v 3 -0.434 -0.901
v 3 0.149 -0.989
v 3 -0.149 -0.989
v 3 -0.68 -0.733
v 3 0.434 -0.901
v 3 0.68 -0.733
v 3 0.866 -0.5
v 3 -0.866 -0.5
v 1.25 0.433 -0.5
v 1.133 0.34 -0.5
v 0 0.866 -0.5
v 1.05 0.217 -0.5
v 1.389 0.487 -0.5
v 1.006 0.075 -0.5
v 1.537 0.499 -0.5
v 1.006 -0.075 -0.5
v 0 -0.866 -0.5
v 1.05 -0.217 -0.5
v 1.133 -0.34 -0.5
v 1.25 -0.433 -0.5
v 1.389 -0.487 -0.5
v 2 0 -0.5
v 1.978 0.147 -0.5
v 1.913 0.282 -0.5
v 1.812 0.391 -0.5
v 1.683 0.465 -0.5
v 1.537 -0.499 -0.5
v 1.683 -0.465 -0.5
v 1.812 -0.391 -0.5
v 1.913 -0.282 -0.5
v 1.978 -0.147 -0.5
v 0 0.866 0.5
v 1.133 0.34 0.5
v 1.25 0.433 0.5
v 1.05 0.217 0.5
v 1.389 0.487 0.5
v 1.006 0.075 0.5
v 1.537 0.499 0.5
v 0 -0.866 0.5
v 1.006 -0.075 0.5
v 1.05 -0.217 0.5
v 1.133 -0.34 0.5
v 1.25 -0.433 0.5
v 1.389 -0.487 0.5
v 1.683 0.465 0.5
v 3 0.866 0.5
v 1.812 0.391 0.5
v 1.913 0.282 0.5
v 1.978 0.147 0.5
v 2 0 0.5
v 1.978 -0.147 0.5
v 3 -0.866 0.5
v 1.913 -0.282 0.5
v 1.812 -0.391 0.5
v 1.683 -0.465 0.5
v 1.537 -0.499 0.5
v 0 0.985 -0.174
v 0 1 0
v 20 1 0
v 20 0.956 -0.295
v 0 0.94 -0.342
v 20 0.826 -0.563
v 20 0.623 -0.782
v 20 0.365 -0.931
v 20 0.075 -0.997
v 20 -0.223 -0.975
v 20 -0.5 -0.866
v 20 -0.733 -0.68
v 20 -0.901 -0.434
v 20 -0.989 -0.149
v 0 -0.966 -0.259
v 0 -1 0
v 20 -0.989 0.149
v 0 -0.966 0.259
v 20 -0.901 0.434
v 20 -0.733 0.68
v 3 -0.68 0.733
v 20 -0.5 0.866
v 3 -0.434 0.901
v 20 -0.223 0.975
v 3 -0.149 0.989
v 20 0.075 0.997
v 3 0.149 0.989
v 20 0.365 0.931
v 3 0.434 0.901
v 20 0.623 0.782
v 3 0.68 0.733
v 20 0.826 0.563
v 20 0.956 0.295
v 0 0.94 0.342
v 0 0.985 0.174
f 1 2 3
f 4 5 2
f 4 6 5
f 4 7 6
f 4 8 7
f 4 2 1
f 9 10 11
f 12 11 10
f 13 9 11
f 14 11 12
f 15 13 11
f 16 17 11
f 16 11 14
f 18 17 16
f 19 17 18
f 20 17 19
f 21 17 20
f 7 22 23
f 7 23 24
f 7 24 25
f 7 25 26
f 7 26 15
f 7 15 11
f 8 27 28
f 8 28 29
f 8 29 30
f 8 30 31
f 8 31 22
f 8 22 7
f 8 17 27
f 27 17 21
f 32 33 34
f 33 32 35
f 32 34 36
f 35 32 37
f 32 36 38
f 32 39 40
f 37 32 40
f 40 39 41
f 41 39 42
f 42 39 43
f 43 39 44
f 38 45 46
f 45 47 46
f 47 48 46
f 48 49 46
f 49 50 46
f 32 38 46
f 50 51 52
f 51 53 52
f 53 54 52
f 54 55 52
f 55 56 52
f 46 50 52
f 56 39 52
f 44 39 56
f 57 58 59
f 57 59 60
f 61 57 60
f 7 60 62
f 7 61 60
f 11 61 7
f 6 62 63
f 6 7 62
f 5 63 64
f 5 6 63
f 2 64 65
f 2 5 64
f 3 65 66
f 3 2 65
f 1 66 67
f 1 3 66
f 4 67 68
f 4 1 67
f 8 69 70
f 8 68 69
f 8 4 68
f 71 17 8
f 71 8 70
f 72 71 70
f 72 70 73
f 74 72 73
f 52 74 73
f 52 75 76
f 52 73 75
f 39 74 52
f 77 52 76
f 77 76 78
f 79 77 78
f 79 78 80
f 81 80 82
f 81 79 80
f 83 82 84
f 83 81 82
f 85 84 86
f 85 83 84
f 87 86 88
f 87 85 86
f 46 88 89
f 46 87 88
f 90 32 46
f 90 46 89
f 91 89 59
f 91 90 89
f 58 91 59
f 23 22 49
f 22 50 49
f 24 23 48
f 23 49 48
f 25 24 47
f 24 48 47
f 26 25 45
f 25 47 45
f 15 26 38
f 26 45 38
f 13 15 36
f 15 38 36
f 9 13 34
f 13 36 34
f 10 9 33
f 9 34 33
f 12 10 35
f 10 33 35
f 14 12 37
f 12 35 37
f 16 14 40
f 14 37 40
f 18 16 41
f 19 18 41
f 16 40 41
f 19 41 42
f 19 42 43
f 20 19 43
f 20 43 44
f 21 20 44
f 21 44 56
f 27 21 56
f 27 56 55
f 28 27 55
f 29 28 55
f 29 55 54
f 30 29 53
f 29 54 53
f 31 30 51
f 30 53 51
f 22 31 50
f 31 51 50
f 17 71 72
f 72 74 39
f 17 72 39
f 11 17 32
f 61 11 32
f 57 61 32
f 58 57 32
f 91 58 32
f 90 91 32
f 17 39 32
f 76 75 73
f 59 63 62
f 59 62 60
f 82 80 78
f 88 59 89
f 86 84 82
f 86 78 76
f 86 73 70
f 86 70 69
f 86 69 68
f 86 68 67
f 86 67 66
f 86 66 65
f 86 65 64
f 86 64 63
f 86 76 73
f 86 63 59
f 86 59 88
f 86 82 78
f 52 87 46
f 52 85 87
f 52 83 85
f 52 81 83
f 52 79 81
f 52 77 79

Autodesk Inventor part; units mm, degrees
ref_plane "YZ Plane" through (0, 0, 0) normal (1, 0, 0) x (0, 1, 0)
ref_plane "XZ Plane" through (0, 0, 0) normal (0, 1, 0) x (-1, 0, 0)
ref_plane "XY Plane" through (0, 0, 0) normal (0, 0, 1) x (1, 0, 0)
sketch "草图1" plane through (0, 0, 0) normal (1, 0, 0) x (0, 1, 0)
  circle A0 centre (0, 0) radius 1
  dimension "直径" = 2
extrude "拉伸1" add sketch "草图1" along normal blind 20
sketch "草图3" plane through (0, 0, 0) normal (0, 1, 0) x (-1, 0, 0)
  line L0 (-20, 1) -> (-20, -1) projected
  line L1 (0, -1) -> (0, 1) projected
  line L2 (0, 1) -> (-20, 1) projected
  line L3 (0, -1) -> (-20, -1) projected
  line L4 (-3, 1) -> (-3, -1)
  line L5 (0, 0.5) -> (-3, 0.5)
  line L6 (0, -0.5) -> (-3, -0.5)
  line L7 (-3, 0) -> (0, 0) construction
  dimension "长" = 3
  dimension "距离" = 1
extrude "拉伸2" cut sketch "草图3" along normal mid plane 10 contours L2 L1 L5 L4 | L4 L6 L1 L3
sketch "草图4" plane through (0, 0, 0) normal (0, 0, 1) x (1, 0, 0)
  line L0 (0, 1) -> (20, 1) projected
  line L1 (0, -1) -> (20, -1) projected
  line L2 (0, 0.866) -> (0, -0.866) projected
  line L3 (0, 0) -> (1.5, 0)
  circle A0 centre (1.5, 0) radius 0.5
  dimension "孔位置1" = 1.5
  dimension "孔径" = 1
extrude "拉伸3" cut sketch "草图4" along normal mid plane 10
properties part number "连接销1" material "木材(桦木)"
